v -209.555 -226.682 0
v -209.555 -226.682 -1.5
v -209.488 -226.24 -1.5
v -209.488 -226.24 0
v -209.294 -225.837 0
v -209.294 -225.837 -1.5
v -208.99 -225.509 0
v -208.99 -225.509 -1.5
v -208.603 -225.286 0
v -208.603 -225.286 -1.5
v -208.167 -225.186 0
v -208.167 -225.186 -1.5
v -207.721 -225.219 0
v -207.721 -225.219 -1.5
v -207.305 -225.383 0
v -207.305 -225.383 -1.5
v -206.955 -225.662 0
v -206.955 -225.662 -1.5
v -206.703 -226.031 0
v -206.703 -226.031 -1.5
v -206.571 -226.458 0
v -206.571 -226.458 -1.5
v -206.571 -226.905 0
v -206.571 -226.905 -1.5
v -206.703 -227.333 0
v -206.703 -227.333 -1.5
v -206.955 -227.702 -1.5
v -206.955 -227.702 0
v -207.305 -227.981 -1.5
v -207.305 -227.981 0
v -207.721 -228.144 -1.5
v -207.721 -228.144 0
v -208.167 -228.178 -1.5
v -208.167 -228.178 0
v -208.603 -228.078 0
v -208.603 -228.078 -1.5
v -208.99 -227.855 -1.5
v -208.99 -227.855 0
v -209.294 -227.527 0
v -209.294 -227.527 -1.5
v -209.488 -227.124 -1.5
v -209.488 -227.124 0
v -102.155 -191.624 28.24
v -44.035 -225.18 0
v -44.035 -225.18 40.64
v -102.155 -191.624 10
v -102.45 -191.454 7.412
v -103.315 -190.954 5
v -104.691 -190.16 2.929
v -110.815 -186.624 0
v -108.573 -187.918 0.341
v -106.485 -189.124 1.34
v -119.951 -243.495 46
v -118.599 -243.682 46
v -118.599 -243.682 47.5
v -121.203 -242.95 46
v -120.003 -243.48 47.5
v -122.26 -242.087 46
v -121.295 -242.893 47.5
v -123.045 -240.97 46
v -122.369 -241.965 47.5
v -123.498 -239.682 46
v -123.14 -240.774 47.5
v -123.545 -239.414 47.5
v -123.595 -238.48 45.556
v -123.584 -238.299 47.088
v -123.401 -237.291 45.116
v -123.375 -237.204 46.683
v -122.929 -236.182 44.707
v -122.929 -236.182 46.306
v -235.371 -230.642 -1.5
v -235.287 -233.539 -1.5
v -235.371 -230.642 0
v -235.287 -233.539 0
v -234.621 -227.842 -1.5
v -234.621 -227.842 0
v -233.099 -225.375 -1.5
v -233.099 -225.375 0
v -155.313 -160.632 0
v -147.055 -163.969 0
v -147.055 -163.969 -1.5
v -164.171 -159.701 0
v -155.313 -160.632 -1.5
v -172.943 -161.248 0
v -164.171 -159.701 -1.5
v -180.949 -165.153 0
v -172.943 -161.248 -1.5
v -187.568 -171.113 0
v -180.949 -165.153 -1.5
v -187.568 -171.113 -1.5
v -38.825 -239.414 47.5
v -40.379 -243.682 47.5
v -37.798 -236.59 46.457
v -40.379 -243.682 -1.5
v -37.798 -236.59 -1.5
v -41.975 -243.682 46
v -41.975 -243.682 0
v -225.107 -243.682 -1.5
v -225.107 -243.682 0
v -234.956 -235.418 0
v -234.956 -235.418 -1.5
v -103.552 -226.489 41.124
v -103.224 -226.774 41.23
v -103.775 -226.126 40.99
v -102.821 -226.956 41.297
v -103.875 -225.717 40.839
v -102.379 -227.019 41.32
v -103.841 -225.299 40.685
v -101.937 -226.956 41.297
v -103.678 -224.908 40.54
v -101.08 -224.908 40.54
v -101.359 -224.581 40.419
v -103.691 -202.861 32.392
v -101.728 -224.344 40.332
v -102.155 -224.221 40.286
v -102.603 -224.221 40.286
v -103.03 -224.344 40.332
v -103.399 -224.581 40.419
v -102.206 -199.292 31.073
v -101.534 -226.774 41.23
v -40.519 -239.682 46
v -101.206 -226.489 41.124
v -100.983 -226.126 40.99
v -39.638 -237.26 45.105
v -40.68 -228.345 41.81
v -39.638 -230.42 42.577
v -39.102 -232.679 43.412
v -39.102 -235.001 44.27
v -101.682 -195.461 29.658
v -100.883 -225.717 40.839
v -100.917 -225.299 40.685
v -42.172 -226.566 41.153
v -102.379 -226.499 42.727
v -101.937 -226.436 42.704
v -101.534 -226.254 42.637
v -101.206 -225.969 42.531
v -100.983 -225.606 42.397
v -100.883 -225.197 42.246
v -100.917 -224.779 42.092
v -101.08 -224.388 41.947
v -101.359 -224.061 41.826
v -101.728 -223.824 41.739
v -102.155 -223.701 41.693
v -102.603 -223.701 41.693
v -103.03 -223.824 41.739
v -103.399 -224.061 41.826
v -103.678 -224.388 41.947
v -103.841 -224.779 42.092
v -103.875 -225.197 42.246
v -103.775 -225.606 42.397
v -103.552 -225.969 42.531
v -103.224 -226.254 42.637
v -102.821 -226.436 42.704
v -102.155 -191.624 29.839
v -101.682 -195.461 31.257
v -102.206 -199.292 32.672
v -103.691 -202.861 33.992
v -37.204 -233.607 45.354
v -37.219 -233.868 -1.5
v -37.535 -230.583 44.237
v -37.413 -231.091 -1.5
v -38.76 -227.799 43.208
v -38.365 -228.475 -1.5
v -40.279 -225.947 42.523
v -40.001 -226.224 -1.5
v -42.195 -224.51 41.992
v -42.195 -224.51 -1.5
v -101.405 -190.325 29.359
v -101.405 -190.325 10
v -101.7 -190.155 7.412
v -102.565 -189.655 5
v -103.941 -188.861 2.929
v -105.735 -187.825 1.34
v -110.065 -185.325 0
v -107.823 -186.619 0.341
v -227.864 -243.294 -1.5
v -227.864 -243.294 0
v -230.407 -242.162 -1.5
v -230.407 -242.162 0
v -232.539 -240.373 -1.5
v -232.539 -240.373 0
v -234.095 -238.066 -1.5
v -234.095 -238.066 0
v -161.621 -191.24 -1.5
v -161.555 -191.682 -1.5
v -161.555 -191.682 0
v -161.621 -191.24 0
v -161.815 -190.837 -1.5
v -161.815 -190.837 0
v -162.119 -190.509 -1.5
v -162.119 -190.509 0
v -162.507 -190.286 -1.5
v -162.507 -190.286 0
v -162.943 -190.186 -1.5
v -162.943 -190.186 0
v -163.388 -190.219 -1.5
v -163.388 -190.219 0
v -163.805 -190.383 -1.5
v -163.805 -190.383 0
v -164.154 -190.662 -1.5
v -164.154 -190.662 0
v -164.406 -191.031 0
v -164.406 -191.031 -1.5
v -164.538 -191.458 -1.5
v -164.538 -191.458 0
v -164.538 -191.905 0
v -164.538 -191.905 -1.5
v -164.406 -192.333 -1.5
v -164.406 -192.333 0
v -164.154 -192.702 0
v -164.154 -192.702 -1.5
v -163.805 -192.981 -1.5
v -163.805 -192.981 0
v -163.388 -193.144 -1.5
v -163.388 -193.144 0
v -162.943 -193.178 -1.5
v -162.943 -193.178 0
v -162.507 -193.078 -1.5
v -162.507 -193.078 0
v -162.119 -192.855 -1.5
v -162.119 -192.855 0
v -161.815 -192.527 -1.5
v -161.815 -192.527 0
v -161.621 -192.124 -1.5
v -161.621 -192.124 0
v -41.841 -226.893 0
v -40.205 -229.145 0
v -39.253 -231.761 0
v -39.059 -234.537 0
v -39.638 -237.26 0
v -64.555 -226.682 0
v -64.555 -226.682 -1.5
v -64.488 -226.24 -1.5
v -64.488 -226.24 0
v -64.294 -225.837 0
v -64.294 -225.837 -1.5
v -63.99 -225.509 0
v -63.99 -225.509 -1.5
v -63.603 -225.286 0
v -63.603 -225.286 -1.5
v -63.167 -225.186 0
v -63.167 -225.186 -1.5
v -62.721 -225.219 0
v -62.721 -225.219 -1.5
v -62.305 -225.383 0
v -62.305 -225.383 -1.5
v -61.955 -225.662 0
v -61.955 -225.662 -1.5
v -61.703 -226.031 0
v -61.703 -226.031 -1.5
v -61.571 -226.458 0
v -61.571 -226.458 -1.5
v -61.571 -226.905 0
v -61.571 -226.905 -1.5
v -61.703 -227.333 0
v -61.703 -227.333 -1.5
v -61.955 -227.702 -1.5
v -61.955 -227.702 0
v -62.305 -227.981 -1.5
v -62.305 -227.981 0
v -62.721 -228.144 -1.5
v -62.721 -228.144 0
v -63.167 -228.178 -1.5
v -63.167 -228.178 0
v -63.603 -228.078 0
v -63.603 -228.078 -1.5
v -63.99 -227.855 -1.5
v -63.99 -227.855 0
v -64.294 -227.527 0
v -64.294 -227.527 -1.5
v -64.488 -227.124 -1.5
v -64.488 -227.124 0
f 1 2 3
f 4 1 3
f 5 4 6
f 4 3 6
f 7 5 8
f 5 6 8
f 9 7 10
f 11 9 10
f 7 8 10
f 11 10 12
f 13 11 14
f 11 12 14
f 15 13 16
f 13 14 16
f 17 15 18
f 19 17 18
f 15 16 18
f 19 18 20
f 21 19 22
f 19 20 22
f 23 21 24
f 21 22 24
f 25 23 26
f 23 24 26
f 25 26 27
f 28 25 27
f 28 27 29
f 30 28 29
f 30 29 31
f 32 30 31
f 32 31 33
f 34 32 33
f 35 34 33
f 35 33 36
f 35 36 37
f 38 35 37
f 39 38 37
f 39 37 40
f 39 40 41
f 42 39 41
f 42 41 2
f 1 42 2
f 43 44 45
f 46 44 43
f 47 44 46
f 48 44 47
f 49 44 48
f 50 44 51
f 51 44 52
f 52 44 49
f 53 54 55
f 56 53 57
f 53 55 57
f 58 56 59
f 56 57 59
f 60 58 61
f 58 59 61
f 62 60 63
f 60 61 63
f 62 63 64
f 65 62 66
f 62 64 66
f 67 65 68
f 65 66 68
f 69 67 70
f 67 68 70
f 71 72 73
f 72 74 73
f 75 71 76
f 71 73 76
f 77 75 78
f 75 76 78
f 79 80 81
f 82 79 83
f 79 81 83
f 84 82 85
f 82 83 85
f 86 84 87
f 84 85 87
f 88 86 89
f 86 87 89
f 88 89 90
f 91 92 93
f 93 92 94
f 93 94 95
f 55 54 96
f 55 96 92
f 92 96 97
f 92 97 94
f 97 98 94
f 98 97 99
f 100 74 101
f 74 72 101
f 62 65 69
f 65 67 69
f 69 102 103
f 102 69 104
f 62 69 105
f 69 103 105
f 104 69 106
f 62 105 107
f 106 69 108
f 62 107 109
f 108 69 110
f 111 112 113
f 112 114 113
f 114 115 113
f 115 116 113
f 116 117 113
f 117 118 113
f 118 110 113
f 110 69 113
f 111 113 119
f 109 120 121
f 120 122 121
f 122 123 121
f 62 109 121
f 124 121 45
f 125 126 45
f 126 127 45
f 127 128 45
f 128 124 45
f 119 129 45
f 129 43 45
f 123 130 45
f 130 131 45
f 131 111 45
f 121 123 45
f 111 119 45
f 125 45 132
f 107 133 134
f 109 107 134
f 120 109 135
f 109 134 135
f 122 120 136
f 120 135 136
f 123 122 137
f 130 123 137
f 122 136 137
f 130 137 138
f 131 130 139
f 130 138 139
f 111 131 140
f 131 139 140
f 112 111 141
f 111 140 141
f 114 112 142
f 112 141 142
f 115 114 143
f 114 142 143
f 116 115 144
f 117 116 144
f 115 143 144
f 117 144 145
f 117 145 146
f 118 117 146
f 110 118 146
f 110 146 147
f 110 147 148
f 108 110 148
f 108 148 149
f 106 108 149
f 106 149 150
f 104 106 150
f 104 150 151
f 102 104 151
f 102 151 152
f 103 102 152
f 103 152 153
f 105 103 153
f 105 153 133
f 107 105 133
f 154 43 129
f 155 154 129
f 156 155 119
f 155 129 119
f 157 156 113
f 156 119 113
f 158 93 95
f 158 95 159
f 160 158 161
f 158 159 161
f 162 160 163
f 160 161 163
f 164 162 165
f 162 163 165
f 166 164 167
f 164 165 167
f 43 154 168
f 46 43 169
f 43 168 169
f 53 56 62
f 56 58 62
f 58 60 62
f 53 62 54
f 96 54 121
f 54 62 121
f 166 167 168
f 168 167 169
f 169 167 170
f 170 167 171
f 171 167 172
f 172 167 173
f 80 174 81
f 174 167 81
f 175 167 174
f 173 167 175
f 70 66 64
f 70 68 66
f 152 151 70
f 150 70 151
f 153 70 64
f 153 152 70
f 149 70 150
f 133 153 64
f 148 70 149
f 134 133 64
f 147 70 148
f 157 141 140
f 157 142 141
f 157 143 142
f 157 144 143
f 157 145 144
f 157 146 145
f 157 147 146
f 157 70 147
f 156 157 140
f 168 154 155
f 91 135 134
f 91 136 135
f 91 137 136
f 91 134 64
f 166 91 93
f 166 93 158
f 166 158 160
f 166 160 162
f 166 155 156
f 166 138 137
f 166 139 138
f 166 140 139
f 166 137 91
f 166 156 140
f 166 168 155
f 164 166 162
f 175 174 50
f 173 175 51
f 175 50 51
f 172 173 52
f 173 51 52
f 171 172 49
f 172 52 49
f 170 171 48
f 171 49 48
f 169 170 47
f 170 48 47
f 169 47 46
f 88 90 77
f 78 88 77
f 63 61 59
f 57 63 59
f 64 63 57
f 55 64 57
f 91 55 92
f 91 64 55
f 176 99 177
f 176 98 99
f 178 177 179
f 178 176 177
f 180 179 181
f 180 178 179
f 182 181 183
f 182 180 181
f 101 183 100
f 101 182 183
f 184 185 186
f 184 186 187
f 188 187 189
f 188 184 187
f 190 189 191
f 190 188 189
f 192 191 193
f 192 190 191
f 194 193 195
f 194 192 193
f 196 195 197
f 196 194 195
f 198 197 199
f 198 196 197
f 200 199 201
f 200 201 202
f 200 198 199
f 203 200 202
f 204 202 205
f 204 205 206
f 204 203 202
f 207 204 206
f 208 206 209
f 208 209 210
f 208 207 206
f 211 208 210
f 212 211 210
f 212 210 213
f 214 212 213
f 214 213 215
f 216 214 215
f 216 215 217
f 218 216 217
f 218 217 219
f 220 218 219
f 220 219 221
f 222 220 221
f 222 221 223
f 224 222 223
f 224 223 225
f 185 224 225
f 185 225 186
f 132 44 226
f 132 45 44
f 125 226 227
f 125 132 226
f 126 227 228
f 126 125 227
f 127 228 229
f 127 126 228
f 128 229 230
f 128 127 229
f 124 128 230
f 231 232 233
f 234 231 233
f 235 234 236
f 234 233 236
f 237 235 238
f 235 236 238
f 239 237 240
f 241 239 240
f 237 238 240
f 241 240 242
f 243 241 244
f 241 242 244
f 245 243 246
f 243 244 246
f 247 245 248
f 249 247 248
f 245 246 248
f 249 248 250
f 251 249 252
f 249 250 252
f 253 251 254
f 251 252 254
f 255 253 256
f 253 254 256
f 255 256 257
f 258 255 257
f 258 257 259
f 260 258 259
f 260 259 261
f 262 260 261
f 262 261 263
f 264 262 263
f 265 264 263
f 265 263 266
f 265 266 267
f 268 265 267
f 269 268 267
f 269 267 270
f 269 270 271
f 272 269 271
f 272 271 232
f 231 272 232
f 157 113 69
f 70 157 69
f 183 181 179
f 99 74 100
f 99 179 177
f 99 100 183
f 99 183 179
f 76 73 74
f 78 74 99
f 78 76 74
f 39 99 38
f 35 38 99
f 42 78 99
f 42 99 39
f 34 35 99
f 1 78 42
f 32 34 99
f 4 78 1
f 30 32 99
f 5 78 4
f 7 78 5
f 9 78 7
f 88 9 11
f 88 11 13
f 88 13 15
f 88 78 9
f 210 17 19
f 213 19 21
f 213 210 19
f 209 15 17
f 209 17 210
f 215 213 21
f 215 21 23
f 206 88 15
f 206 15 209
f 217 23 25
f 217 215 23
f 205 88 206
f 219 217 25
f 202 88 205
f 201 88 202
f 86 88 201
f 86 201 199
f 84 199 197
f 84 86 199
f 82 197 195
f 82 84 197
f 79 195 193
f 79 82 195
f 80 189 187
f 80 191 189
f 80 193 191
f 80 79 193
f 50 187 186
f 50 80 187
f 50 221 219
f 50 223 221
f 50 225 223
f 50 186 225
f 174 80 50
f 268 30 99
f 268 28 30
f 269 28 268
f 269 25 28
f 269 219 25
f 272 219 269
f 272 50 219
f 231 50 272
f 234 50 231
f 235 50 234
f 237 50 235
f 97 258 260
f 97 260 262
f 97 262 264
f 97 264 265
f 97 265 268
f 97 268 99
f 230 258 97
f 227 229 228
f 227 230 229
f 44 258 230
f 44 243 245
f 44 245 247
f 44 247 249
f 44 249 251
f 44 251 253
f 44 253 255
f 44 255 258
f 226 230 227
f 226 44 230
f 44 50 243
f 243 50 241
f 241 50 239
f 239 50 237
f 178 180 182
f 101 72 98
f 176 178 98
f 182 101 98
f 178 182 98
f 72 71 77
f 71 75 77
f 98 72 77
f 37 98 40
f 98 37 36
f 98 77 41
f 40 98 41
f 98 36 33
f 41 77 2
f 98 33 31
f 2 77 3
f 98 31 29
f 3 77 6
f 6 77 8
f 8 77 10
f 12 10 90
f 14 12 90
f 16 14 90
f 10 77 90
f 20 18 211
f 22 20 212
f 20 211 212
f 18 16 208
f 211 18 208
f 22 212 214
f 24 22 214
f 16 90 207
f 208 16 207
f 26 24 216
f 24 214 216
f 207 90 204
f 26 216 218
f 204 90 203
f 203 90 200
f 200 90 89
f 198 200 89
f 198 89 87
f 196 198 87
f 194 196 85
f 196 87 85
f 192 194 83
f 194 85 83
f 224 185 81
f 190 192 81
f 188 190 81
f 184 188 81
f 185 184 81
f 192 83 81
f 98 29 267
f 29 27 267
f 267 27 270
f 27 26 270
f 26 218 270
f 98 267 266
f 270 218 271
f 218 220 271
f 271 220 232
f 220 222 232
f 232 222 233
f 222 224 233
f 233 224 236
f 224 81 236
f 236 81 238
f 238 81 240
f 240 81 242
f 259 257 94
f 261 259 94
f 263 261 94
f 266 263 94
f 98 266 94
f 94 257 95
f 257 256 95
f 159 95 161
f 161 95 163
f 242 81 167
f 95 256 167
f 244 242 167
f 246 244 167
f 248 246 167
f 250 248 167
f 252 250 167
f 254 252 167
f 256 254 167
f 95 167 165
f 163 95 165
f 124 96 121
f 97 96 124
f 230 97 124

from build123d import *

# Parameters (mm, degrees)
SKETCH_1_R          = 1.5
EXTRUDE_1_DEPTH     = 46
SKETCH_6_W          = 244.099615043
SKETCH_6_H          = 133.346377704
CUT_EXTRUDE_3_DEPTH = 339.792470358
SHELL_1_T           = 1.5
CUT_EXTRUDE_START   = -1.5
CUT_EXTRUDE_2_DEPTH = 342.316954288
FILLET_2_R          = 10
FILLET_3_R          = 10
FILLET_4_R          = 5
SKETCH_7_W          = 1.712142643
SKETCH_7_H          = 34.810742179
CUT_EXTRUDE_4_DEPTH = 5
FILLET_5_R          = 10
SKETCH_10_R         = 1.5
CUT_EXTRUDE_5_DEPTH = 2
SKETCH_11_R         = 1.5
CUT_EXTRUDE_6_DEPTH = 2


with BuildPart() as part:
    # 草图1 → 凸台-拉伸1 (new body)
    with BuildSketch(Plane.XY):
        with BuildLine():
            Line((-186.419017908, -172.076823512), (-234.49796572, -229.375082296))
            Line((-234.49796572, -229.375082296), (-231.975297342, -243.681845608))
            Line((-231.975297342, -243.681845608), (-41.975297342, -243.681845608))
            Line((-41.975297342, -243.681845608), (-36.768061348, -229.375082296))
            Line((-36.768061348, -229.375082296), (-147.804662393, -165.268070792))
            ThreePointArc((-147.804662393, -165.268070792), (-168.350931812, -161.645209141), (-186.419017908, -172.076823512))
        make_face()
        with Locations((-163.054662393, -191.681845608)):
            Circle(SKETCH_1_R, mode=Mode.SUBTRACT)
    extrude(amount=EXTRUDE_1_DEPTH)

    # 草图6 → 切除-拉伸3 (cut, through all)
    with BuildSketch(Plane(origin=(0, -13.84451284, -37.461622979), x_dir=(1, 0, 0), z_dir=(0, 0.3466501408716292, 0.9379944988291136))):
        with Locations((-134.599820809, -204.098171804)):
            Rectangle(SKETCH_6_W, SKETCH_6_H)
    extrude(amount=CUT_EXTRUDE_3_DEPTH, mode=Mode.SUBTRACT)

    # 抽壳1
    shell_1_openings = [part.faces().sort_by_distance(p)[0] for p in [
        (-136.975297342, -243.681845608, 23),
        (-164.554662393, -191.681845608, 14.463541988),
    ]]
    offset(amount=SHELL_1_T, openings=shell_1_openings, kind=Kind.INTERSECTION)

    # 草图2 → 切除-拉伸2 (cut, through all)
    with BuildSketch(Plane(origin=(0, 0, -1.5), x_dir=(-1, 0, 0), z_dir=(0, 0, -1)).offset(CUT_EXTRUDE_START)):
        with BuildLine():
            Line((103.691214377, -202.861337532), (127.258945703, -243.681845608))
            Line((127.258945703, -243.681845608), (233.49843726, -243.681845608))
            Line((233.49843726, -243.681845608), (236.096637562, -228.946719467))
            Line((236.096637562, -228.946719467), (187.568084573, -171.112642098))
            ThreePointArc((187.568084573, -171.112642098), (168.611404078, -160.167997512), (147.054662393, -163.969032687))
            Line((147.054662393, -163.969032687), (102.8873668, -189.469032687))
            ThreePointArc((102.8873668, -189.469032687), (101.708543429, -196.260066445), (103.691214377, -202.861337532))
        make_face()
    extrude(amount=-CUT_EXTRUDE_2_DEPTH, mode=Mode.SUBTRACT)

    # 圆角2
    fillet_2_edges = [part.edges().sort_by_distance(p)[0] for p in [
        (-34.928038952, -228.705368914, 21.021316252),
        (-36.768061348, -229.375082296, 21.095489388),
    ]]
    fillet(fillet_2_edges, radius=FILLET_2_R)

    # 圆角3
    fillet_3_edges = [part.edges().sort_by_distance(p)[0] for p in [
        (-236.096637562, -228.946719467, -0.75),
        (-233.49843726, -243.681845608, -0.75),
    ]]
    fillet(fillet_3_edges, radius=FILLET_3_R)

    # 圆角4
    fillet_4_edges = [part.edges().sort_by_distance(p)[0] for p in [
        (-127.258945703, -243.681845608, 46.75),
    ]]
    fillet(fillet_4_edges, radius=FILLET_4_R)

    # 草图7 → 切除-拉伸4 (cut)
    with BuildSketch(Plane(origin=(-107.764339469, -186.653311204, 0), x_dir=(0.8660254037844399, -0.4999999999999979, 0), z_dir=(0.49999999999999784, 0.8660254037844398, 0))):
        with Locations((6.487514288, -17.40537109)):
            Rectangle(SKETCH_7_W, SKETCH_7_H)
    extrude(amount=-CUT_EXTRUDE_4_DEPTH, mode=Mode.SUBTRACT)

    # 圆角5
    fillet_5_edges = [part.edges().sort_by_distance(p)[0] for p in [
        (-101.779607776, -190.974623061, 0),
    ]]
    fillet(fillet_5_edges, radius=FILLET_5_R)

    # 草图10 → 切除-拉伸5 (cut)
    with BuildSketch(Plane(origin=(0, 0, -1.5), x_dir=(-1, 0, 0), z_dir=(0, 0, -1))):
        with Locations((208.054662393, -226.681845608)):
            Circle(SKETCH_10_R)
        with Locations((63.054662393, -226.681845608)):
            Circle(SKETCH_10_R)
    extrude(amount=-CUT_EXTRUDE_5_DEPTH, mode=Mode.SUBTRACT)

    # 草图11 → 切除-拉伸6 (cut)
    with BuildSketch(Plane(origin=(0, -13.324537629, -36.054631231), x_dir=(1, 0, 0), z_dir=(0, 0.3466501408716292, 0.9379944988291135))):
        with Locations(Location((-102.379030683, -225.76615913, 0), (0, 0, 270))):
            Circle(SKETCH_11_R)
    extrude(amount=-CUT_EXTRUDE_6_DEPTH, mode=Mode.SUBTRACT)


solid = part.part
